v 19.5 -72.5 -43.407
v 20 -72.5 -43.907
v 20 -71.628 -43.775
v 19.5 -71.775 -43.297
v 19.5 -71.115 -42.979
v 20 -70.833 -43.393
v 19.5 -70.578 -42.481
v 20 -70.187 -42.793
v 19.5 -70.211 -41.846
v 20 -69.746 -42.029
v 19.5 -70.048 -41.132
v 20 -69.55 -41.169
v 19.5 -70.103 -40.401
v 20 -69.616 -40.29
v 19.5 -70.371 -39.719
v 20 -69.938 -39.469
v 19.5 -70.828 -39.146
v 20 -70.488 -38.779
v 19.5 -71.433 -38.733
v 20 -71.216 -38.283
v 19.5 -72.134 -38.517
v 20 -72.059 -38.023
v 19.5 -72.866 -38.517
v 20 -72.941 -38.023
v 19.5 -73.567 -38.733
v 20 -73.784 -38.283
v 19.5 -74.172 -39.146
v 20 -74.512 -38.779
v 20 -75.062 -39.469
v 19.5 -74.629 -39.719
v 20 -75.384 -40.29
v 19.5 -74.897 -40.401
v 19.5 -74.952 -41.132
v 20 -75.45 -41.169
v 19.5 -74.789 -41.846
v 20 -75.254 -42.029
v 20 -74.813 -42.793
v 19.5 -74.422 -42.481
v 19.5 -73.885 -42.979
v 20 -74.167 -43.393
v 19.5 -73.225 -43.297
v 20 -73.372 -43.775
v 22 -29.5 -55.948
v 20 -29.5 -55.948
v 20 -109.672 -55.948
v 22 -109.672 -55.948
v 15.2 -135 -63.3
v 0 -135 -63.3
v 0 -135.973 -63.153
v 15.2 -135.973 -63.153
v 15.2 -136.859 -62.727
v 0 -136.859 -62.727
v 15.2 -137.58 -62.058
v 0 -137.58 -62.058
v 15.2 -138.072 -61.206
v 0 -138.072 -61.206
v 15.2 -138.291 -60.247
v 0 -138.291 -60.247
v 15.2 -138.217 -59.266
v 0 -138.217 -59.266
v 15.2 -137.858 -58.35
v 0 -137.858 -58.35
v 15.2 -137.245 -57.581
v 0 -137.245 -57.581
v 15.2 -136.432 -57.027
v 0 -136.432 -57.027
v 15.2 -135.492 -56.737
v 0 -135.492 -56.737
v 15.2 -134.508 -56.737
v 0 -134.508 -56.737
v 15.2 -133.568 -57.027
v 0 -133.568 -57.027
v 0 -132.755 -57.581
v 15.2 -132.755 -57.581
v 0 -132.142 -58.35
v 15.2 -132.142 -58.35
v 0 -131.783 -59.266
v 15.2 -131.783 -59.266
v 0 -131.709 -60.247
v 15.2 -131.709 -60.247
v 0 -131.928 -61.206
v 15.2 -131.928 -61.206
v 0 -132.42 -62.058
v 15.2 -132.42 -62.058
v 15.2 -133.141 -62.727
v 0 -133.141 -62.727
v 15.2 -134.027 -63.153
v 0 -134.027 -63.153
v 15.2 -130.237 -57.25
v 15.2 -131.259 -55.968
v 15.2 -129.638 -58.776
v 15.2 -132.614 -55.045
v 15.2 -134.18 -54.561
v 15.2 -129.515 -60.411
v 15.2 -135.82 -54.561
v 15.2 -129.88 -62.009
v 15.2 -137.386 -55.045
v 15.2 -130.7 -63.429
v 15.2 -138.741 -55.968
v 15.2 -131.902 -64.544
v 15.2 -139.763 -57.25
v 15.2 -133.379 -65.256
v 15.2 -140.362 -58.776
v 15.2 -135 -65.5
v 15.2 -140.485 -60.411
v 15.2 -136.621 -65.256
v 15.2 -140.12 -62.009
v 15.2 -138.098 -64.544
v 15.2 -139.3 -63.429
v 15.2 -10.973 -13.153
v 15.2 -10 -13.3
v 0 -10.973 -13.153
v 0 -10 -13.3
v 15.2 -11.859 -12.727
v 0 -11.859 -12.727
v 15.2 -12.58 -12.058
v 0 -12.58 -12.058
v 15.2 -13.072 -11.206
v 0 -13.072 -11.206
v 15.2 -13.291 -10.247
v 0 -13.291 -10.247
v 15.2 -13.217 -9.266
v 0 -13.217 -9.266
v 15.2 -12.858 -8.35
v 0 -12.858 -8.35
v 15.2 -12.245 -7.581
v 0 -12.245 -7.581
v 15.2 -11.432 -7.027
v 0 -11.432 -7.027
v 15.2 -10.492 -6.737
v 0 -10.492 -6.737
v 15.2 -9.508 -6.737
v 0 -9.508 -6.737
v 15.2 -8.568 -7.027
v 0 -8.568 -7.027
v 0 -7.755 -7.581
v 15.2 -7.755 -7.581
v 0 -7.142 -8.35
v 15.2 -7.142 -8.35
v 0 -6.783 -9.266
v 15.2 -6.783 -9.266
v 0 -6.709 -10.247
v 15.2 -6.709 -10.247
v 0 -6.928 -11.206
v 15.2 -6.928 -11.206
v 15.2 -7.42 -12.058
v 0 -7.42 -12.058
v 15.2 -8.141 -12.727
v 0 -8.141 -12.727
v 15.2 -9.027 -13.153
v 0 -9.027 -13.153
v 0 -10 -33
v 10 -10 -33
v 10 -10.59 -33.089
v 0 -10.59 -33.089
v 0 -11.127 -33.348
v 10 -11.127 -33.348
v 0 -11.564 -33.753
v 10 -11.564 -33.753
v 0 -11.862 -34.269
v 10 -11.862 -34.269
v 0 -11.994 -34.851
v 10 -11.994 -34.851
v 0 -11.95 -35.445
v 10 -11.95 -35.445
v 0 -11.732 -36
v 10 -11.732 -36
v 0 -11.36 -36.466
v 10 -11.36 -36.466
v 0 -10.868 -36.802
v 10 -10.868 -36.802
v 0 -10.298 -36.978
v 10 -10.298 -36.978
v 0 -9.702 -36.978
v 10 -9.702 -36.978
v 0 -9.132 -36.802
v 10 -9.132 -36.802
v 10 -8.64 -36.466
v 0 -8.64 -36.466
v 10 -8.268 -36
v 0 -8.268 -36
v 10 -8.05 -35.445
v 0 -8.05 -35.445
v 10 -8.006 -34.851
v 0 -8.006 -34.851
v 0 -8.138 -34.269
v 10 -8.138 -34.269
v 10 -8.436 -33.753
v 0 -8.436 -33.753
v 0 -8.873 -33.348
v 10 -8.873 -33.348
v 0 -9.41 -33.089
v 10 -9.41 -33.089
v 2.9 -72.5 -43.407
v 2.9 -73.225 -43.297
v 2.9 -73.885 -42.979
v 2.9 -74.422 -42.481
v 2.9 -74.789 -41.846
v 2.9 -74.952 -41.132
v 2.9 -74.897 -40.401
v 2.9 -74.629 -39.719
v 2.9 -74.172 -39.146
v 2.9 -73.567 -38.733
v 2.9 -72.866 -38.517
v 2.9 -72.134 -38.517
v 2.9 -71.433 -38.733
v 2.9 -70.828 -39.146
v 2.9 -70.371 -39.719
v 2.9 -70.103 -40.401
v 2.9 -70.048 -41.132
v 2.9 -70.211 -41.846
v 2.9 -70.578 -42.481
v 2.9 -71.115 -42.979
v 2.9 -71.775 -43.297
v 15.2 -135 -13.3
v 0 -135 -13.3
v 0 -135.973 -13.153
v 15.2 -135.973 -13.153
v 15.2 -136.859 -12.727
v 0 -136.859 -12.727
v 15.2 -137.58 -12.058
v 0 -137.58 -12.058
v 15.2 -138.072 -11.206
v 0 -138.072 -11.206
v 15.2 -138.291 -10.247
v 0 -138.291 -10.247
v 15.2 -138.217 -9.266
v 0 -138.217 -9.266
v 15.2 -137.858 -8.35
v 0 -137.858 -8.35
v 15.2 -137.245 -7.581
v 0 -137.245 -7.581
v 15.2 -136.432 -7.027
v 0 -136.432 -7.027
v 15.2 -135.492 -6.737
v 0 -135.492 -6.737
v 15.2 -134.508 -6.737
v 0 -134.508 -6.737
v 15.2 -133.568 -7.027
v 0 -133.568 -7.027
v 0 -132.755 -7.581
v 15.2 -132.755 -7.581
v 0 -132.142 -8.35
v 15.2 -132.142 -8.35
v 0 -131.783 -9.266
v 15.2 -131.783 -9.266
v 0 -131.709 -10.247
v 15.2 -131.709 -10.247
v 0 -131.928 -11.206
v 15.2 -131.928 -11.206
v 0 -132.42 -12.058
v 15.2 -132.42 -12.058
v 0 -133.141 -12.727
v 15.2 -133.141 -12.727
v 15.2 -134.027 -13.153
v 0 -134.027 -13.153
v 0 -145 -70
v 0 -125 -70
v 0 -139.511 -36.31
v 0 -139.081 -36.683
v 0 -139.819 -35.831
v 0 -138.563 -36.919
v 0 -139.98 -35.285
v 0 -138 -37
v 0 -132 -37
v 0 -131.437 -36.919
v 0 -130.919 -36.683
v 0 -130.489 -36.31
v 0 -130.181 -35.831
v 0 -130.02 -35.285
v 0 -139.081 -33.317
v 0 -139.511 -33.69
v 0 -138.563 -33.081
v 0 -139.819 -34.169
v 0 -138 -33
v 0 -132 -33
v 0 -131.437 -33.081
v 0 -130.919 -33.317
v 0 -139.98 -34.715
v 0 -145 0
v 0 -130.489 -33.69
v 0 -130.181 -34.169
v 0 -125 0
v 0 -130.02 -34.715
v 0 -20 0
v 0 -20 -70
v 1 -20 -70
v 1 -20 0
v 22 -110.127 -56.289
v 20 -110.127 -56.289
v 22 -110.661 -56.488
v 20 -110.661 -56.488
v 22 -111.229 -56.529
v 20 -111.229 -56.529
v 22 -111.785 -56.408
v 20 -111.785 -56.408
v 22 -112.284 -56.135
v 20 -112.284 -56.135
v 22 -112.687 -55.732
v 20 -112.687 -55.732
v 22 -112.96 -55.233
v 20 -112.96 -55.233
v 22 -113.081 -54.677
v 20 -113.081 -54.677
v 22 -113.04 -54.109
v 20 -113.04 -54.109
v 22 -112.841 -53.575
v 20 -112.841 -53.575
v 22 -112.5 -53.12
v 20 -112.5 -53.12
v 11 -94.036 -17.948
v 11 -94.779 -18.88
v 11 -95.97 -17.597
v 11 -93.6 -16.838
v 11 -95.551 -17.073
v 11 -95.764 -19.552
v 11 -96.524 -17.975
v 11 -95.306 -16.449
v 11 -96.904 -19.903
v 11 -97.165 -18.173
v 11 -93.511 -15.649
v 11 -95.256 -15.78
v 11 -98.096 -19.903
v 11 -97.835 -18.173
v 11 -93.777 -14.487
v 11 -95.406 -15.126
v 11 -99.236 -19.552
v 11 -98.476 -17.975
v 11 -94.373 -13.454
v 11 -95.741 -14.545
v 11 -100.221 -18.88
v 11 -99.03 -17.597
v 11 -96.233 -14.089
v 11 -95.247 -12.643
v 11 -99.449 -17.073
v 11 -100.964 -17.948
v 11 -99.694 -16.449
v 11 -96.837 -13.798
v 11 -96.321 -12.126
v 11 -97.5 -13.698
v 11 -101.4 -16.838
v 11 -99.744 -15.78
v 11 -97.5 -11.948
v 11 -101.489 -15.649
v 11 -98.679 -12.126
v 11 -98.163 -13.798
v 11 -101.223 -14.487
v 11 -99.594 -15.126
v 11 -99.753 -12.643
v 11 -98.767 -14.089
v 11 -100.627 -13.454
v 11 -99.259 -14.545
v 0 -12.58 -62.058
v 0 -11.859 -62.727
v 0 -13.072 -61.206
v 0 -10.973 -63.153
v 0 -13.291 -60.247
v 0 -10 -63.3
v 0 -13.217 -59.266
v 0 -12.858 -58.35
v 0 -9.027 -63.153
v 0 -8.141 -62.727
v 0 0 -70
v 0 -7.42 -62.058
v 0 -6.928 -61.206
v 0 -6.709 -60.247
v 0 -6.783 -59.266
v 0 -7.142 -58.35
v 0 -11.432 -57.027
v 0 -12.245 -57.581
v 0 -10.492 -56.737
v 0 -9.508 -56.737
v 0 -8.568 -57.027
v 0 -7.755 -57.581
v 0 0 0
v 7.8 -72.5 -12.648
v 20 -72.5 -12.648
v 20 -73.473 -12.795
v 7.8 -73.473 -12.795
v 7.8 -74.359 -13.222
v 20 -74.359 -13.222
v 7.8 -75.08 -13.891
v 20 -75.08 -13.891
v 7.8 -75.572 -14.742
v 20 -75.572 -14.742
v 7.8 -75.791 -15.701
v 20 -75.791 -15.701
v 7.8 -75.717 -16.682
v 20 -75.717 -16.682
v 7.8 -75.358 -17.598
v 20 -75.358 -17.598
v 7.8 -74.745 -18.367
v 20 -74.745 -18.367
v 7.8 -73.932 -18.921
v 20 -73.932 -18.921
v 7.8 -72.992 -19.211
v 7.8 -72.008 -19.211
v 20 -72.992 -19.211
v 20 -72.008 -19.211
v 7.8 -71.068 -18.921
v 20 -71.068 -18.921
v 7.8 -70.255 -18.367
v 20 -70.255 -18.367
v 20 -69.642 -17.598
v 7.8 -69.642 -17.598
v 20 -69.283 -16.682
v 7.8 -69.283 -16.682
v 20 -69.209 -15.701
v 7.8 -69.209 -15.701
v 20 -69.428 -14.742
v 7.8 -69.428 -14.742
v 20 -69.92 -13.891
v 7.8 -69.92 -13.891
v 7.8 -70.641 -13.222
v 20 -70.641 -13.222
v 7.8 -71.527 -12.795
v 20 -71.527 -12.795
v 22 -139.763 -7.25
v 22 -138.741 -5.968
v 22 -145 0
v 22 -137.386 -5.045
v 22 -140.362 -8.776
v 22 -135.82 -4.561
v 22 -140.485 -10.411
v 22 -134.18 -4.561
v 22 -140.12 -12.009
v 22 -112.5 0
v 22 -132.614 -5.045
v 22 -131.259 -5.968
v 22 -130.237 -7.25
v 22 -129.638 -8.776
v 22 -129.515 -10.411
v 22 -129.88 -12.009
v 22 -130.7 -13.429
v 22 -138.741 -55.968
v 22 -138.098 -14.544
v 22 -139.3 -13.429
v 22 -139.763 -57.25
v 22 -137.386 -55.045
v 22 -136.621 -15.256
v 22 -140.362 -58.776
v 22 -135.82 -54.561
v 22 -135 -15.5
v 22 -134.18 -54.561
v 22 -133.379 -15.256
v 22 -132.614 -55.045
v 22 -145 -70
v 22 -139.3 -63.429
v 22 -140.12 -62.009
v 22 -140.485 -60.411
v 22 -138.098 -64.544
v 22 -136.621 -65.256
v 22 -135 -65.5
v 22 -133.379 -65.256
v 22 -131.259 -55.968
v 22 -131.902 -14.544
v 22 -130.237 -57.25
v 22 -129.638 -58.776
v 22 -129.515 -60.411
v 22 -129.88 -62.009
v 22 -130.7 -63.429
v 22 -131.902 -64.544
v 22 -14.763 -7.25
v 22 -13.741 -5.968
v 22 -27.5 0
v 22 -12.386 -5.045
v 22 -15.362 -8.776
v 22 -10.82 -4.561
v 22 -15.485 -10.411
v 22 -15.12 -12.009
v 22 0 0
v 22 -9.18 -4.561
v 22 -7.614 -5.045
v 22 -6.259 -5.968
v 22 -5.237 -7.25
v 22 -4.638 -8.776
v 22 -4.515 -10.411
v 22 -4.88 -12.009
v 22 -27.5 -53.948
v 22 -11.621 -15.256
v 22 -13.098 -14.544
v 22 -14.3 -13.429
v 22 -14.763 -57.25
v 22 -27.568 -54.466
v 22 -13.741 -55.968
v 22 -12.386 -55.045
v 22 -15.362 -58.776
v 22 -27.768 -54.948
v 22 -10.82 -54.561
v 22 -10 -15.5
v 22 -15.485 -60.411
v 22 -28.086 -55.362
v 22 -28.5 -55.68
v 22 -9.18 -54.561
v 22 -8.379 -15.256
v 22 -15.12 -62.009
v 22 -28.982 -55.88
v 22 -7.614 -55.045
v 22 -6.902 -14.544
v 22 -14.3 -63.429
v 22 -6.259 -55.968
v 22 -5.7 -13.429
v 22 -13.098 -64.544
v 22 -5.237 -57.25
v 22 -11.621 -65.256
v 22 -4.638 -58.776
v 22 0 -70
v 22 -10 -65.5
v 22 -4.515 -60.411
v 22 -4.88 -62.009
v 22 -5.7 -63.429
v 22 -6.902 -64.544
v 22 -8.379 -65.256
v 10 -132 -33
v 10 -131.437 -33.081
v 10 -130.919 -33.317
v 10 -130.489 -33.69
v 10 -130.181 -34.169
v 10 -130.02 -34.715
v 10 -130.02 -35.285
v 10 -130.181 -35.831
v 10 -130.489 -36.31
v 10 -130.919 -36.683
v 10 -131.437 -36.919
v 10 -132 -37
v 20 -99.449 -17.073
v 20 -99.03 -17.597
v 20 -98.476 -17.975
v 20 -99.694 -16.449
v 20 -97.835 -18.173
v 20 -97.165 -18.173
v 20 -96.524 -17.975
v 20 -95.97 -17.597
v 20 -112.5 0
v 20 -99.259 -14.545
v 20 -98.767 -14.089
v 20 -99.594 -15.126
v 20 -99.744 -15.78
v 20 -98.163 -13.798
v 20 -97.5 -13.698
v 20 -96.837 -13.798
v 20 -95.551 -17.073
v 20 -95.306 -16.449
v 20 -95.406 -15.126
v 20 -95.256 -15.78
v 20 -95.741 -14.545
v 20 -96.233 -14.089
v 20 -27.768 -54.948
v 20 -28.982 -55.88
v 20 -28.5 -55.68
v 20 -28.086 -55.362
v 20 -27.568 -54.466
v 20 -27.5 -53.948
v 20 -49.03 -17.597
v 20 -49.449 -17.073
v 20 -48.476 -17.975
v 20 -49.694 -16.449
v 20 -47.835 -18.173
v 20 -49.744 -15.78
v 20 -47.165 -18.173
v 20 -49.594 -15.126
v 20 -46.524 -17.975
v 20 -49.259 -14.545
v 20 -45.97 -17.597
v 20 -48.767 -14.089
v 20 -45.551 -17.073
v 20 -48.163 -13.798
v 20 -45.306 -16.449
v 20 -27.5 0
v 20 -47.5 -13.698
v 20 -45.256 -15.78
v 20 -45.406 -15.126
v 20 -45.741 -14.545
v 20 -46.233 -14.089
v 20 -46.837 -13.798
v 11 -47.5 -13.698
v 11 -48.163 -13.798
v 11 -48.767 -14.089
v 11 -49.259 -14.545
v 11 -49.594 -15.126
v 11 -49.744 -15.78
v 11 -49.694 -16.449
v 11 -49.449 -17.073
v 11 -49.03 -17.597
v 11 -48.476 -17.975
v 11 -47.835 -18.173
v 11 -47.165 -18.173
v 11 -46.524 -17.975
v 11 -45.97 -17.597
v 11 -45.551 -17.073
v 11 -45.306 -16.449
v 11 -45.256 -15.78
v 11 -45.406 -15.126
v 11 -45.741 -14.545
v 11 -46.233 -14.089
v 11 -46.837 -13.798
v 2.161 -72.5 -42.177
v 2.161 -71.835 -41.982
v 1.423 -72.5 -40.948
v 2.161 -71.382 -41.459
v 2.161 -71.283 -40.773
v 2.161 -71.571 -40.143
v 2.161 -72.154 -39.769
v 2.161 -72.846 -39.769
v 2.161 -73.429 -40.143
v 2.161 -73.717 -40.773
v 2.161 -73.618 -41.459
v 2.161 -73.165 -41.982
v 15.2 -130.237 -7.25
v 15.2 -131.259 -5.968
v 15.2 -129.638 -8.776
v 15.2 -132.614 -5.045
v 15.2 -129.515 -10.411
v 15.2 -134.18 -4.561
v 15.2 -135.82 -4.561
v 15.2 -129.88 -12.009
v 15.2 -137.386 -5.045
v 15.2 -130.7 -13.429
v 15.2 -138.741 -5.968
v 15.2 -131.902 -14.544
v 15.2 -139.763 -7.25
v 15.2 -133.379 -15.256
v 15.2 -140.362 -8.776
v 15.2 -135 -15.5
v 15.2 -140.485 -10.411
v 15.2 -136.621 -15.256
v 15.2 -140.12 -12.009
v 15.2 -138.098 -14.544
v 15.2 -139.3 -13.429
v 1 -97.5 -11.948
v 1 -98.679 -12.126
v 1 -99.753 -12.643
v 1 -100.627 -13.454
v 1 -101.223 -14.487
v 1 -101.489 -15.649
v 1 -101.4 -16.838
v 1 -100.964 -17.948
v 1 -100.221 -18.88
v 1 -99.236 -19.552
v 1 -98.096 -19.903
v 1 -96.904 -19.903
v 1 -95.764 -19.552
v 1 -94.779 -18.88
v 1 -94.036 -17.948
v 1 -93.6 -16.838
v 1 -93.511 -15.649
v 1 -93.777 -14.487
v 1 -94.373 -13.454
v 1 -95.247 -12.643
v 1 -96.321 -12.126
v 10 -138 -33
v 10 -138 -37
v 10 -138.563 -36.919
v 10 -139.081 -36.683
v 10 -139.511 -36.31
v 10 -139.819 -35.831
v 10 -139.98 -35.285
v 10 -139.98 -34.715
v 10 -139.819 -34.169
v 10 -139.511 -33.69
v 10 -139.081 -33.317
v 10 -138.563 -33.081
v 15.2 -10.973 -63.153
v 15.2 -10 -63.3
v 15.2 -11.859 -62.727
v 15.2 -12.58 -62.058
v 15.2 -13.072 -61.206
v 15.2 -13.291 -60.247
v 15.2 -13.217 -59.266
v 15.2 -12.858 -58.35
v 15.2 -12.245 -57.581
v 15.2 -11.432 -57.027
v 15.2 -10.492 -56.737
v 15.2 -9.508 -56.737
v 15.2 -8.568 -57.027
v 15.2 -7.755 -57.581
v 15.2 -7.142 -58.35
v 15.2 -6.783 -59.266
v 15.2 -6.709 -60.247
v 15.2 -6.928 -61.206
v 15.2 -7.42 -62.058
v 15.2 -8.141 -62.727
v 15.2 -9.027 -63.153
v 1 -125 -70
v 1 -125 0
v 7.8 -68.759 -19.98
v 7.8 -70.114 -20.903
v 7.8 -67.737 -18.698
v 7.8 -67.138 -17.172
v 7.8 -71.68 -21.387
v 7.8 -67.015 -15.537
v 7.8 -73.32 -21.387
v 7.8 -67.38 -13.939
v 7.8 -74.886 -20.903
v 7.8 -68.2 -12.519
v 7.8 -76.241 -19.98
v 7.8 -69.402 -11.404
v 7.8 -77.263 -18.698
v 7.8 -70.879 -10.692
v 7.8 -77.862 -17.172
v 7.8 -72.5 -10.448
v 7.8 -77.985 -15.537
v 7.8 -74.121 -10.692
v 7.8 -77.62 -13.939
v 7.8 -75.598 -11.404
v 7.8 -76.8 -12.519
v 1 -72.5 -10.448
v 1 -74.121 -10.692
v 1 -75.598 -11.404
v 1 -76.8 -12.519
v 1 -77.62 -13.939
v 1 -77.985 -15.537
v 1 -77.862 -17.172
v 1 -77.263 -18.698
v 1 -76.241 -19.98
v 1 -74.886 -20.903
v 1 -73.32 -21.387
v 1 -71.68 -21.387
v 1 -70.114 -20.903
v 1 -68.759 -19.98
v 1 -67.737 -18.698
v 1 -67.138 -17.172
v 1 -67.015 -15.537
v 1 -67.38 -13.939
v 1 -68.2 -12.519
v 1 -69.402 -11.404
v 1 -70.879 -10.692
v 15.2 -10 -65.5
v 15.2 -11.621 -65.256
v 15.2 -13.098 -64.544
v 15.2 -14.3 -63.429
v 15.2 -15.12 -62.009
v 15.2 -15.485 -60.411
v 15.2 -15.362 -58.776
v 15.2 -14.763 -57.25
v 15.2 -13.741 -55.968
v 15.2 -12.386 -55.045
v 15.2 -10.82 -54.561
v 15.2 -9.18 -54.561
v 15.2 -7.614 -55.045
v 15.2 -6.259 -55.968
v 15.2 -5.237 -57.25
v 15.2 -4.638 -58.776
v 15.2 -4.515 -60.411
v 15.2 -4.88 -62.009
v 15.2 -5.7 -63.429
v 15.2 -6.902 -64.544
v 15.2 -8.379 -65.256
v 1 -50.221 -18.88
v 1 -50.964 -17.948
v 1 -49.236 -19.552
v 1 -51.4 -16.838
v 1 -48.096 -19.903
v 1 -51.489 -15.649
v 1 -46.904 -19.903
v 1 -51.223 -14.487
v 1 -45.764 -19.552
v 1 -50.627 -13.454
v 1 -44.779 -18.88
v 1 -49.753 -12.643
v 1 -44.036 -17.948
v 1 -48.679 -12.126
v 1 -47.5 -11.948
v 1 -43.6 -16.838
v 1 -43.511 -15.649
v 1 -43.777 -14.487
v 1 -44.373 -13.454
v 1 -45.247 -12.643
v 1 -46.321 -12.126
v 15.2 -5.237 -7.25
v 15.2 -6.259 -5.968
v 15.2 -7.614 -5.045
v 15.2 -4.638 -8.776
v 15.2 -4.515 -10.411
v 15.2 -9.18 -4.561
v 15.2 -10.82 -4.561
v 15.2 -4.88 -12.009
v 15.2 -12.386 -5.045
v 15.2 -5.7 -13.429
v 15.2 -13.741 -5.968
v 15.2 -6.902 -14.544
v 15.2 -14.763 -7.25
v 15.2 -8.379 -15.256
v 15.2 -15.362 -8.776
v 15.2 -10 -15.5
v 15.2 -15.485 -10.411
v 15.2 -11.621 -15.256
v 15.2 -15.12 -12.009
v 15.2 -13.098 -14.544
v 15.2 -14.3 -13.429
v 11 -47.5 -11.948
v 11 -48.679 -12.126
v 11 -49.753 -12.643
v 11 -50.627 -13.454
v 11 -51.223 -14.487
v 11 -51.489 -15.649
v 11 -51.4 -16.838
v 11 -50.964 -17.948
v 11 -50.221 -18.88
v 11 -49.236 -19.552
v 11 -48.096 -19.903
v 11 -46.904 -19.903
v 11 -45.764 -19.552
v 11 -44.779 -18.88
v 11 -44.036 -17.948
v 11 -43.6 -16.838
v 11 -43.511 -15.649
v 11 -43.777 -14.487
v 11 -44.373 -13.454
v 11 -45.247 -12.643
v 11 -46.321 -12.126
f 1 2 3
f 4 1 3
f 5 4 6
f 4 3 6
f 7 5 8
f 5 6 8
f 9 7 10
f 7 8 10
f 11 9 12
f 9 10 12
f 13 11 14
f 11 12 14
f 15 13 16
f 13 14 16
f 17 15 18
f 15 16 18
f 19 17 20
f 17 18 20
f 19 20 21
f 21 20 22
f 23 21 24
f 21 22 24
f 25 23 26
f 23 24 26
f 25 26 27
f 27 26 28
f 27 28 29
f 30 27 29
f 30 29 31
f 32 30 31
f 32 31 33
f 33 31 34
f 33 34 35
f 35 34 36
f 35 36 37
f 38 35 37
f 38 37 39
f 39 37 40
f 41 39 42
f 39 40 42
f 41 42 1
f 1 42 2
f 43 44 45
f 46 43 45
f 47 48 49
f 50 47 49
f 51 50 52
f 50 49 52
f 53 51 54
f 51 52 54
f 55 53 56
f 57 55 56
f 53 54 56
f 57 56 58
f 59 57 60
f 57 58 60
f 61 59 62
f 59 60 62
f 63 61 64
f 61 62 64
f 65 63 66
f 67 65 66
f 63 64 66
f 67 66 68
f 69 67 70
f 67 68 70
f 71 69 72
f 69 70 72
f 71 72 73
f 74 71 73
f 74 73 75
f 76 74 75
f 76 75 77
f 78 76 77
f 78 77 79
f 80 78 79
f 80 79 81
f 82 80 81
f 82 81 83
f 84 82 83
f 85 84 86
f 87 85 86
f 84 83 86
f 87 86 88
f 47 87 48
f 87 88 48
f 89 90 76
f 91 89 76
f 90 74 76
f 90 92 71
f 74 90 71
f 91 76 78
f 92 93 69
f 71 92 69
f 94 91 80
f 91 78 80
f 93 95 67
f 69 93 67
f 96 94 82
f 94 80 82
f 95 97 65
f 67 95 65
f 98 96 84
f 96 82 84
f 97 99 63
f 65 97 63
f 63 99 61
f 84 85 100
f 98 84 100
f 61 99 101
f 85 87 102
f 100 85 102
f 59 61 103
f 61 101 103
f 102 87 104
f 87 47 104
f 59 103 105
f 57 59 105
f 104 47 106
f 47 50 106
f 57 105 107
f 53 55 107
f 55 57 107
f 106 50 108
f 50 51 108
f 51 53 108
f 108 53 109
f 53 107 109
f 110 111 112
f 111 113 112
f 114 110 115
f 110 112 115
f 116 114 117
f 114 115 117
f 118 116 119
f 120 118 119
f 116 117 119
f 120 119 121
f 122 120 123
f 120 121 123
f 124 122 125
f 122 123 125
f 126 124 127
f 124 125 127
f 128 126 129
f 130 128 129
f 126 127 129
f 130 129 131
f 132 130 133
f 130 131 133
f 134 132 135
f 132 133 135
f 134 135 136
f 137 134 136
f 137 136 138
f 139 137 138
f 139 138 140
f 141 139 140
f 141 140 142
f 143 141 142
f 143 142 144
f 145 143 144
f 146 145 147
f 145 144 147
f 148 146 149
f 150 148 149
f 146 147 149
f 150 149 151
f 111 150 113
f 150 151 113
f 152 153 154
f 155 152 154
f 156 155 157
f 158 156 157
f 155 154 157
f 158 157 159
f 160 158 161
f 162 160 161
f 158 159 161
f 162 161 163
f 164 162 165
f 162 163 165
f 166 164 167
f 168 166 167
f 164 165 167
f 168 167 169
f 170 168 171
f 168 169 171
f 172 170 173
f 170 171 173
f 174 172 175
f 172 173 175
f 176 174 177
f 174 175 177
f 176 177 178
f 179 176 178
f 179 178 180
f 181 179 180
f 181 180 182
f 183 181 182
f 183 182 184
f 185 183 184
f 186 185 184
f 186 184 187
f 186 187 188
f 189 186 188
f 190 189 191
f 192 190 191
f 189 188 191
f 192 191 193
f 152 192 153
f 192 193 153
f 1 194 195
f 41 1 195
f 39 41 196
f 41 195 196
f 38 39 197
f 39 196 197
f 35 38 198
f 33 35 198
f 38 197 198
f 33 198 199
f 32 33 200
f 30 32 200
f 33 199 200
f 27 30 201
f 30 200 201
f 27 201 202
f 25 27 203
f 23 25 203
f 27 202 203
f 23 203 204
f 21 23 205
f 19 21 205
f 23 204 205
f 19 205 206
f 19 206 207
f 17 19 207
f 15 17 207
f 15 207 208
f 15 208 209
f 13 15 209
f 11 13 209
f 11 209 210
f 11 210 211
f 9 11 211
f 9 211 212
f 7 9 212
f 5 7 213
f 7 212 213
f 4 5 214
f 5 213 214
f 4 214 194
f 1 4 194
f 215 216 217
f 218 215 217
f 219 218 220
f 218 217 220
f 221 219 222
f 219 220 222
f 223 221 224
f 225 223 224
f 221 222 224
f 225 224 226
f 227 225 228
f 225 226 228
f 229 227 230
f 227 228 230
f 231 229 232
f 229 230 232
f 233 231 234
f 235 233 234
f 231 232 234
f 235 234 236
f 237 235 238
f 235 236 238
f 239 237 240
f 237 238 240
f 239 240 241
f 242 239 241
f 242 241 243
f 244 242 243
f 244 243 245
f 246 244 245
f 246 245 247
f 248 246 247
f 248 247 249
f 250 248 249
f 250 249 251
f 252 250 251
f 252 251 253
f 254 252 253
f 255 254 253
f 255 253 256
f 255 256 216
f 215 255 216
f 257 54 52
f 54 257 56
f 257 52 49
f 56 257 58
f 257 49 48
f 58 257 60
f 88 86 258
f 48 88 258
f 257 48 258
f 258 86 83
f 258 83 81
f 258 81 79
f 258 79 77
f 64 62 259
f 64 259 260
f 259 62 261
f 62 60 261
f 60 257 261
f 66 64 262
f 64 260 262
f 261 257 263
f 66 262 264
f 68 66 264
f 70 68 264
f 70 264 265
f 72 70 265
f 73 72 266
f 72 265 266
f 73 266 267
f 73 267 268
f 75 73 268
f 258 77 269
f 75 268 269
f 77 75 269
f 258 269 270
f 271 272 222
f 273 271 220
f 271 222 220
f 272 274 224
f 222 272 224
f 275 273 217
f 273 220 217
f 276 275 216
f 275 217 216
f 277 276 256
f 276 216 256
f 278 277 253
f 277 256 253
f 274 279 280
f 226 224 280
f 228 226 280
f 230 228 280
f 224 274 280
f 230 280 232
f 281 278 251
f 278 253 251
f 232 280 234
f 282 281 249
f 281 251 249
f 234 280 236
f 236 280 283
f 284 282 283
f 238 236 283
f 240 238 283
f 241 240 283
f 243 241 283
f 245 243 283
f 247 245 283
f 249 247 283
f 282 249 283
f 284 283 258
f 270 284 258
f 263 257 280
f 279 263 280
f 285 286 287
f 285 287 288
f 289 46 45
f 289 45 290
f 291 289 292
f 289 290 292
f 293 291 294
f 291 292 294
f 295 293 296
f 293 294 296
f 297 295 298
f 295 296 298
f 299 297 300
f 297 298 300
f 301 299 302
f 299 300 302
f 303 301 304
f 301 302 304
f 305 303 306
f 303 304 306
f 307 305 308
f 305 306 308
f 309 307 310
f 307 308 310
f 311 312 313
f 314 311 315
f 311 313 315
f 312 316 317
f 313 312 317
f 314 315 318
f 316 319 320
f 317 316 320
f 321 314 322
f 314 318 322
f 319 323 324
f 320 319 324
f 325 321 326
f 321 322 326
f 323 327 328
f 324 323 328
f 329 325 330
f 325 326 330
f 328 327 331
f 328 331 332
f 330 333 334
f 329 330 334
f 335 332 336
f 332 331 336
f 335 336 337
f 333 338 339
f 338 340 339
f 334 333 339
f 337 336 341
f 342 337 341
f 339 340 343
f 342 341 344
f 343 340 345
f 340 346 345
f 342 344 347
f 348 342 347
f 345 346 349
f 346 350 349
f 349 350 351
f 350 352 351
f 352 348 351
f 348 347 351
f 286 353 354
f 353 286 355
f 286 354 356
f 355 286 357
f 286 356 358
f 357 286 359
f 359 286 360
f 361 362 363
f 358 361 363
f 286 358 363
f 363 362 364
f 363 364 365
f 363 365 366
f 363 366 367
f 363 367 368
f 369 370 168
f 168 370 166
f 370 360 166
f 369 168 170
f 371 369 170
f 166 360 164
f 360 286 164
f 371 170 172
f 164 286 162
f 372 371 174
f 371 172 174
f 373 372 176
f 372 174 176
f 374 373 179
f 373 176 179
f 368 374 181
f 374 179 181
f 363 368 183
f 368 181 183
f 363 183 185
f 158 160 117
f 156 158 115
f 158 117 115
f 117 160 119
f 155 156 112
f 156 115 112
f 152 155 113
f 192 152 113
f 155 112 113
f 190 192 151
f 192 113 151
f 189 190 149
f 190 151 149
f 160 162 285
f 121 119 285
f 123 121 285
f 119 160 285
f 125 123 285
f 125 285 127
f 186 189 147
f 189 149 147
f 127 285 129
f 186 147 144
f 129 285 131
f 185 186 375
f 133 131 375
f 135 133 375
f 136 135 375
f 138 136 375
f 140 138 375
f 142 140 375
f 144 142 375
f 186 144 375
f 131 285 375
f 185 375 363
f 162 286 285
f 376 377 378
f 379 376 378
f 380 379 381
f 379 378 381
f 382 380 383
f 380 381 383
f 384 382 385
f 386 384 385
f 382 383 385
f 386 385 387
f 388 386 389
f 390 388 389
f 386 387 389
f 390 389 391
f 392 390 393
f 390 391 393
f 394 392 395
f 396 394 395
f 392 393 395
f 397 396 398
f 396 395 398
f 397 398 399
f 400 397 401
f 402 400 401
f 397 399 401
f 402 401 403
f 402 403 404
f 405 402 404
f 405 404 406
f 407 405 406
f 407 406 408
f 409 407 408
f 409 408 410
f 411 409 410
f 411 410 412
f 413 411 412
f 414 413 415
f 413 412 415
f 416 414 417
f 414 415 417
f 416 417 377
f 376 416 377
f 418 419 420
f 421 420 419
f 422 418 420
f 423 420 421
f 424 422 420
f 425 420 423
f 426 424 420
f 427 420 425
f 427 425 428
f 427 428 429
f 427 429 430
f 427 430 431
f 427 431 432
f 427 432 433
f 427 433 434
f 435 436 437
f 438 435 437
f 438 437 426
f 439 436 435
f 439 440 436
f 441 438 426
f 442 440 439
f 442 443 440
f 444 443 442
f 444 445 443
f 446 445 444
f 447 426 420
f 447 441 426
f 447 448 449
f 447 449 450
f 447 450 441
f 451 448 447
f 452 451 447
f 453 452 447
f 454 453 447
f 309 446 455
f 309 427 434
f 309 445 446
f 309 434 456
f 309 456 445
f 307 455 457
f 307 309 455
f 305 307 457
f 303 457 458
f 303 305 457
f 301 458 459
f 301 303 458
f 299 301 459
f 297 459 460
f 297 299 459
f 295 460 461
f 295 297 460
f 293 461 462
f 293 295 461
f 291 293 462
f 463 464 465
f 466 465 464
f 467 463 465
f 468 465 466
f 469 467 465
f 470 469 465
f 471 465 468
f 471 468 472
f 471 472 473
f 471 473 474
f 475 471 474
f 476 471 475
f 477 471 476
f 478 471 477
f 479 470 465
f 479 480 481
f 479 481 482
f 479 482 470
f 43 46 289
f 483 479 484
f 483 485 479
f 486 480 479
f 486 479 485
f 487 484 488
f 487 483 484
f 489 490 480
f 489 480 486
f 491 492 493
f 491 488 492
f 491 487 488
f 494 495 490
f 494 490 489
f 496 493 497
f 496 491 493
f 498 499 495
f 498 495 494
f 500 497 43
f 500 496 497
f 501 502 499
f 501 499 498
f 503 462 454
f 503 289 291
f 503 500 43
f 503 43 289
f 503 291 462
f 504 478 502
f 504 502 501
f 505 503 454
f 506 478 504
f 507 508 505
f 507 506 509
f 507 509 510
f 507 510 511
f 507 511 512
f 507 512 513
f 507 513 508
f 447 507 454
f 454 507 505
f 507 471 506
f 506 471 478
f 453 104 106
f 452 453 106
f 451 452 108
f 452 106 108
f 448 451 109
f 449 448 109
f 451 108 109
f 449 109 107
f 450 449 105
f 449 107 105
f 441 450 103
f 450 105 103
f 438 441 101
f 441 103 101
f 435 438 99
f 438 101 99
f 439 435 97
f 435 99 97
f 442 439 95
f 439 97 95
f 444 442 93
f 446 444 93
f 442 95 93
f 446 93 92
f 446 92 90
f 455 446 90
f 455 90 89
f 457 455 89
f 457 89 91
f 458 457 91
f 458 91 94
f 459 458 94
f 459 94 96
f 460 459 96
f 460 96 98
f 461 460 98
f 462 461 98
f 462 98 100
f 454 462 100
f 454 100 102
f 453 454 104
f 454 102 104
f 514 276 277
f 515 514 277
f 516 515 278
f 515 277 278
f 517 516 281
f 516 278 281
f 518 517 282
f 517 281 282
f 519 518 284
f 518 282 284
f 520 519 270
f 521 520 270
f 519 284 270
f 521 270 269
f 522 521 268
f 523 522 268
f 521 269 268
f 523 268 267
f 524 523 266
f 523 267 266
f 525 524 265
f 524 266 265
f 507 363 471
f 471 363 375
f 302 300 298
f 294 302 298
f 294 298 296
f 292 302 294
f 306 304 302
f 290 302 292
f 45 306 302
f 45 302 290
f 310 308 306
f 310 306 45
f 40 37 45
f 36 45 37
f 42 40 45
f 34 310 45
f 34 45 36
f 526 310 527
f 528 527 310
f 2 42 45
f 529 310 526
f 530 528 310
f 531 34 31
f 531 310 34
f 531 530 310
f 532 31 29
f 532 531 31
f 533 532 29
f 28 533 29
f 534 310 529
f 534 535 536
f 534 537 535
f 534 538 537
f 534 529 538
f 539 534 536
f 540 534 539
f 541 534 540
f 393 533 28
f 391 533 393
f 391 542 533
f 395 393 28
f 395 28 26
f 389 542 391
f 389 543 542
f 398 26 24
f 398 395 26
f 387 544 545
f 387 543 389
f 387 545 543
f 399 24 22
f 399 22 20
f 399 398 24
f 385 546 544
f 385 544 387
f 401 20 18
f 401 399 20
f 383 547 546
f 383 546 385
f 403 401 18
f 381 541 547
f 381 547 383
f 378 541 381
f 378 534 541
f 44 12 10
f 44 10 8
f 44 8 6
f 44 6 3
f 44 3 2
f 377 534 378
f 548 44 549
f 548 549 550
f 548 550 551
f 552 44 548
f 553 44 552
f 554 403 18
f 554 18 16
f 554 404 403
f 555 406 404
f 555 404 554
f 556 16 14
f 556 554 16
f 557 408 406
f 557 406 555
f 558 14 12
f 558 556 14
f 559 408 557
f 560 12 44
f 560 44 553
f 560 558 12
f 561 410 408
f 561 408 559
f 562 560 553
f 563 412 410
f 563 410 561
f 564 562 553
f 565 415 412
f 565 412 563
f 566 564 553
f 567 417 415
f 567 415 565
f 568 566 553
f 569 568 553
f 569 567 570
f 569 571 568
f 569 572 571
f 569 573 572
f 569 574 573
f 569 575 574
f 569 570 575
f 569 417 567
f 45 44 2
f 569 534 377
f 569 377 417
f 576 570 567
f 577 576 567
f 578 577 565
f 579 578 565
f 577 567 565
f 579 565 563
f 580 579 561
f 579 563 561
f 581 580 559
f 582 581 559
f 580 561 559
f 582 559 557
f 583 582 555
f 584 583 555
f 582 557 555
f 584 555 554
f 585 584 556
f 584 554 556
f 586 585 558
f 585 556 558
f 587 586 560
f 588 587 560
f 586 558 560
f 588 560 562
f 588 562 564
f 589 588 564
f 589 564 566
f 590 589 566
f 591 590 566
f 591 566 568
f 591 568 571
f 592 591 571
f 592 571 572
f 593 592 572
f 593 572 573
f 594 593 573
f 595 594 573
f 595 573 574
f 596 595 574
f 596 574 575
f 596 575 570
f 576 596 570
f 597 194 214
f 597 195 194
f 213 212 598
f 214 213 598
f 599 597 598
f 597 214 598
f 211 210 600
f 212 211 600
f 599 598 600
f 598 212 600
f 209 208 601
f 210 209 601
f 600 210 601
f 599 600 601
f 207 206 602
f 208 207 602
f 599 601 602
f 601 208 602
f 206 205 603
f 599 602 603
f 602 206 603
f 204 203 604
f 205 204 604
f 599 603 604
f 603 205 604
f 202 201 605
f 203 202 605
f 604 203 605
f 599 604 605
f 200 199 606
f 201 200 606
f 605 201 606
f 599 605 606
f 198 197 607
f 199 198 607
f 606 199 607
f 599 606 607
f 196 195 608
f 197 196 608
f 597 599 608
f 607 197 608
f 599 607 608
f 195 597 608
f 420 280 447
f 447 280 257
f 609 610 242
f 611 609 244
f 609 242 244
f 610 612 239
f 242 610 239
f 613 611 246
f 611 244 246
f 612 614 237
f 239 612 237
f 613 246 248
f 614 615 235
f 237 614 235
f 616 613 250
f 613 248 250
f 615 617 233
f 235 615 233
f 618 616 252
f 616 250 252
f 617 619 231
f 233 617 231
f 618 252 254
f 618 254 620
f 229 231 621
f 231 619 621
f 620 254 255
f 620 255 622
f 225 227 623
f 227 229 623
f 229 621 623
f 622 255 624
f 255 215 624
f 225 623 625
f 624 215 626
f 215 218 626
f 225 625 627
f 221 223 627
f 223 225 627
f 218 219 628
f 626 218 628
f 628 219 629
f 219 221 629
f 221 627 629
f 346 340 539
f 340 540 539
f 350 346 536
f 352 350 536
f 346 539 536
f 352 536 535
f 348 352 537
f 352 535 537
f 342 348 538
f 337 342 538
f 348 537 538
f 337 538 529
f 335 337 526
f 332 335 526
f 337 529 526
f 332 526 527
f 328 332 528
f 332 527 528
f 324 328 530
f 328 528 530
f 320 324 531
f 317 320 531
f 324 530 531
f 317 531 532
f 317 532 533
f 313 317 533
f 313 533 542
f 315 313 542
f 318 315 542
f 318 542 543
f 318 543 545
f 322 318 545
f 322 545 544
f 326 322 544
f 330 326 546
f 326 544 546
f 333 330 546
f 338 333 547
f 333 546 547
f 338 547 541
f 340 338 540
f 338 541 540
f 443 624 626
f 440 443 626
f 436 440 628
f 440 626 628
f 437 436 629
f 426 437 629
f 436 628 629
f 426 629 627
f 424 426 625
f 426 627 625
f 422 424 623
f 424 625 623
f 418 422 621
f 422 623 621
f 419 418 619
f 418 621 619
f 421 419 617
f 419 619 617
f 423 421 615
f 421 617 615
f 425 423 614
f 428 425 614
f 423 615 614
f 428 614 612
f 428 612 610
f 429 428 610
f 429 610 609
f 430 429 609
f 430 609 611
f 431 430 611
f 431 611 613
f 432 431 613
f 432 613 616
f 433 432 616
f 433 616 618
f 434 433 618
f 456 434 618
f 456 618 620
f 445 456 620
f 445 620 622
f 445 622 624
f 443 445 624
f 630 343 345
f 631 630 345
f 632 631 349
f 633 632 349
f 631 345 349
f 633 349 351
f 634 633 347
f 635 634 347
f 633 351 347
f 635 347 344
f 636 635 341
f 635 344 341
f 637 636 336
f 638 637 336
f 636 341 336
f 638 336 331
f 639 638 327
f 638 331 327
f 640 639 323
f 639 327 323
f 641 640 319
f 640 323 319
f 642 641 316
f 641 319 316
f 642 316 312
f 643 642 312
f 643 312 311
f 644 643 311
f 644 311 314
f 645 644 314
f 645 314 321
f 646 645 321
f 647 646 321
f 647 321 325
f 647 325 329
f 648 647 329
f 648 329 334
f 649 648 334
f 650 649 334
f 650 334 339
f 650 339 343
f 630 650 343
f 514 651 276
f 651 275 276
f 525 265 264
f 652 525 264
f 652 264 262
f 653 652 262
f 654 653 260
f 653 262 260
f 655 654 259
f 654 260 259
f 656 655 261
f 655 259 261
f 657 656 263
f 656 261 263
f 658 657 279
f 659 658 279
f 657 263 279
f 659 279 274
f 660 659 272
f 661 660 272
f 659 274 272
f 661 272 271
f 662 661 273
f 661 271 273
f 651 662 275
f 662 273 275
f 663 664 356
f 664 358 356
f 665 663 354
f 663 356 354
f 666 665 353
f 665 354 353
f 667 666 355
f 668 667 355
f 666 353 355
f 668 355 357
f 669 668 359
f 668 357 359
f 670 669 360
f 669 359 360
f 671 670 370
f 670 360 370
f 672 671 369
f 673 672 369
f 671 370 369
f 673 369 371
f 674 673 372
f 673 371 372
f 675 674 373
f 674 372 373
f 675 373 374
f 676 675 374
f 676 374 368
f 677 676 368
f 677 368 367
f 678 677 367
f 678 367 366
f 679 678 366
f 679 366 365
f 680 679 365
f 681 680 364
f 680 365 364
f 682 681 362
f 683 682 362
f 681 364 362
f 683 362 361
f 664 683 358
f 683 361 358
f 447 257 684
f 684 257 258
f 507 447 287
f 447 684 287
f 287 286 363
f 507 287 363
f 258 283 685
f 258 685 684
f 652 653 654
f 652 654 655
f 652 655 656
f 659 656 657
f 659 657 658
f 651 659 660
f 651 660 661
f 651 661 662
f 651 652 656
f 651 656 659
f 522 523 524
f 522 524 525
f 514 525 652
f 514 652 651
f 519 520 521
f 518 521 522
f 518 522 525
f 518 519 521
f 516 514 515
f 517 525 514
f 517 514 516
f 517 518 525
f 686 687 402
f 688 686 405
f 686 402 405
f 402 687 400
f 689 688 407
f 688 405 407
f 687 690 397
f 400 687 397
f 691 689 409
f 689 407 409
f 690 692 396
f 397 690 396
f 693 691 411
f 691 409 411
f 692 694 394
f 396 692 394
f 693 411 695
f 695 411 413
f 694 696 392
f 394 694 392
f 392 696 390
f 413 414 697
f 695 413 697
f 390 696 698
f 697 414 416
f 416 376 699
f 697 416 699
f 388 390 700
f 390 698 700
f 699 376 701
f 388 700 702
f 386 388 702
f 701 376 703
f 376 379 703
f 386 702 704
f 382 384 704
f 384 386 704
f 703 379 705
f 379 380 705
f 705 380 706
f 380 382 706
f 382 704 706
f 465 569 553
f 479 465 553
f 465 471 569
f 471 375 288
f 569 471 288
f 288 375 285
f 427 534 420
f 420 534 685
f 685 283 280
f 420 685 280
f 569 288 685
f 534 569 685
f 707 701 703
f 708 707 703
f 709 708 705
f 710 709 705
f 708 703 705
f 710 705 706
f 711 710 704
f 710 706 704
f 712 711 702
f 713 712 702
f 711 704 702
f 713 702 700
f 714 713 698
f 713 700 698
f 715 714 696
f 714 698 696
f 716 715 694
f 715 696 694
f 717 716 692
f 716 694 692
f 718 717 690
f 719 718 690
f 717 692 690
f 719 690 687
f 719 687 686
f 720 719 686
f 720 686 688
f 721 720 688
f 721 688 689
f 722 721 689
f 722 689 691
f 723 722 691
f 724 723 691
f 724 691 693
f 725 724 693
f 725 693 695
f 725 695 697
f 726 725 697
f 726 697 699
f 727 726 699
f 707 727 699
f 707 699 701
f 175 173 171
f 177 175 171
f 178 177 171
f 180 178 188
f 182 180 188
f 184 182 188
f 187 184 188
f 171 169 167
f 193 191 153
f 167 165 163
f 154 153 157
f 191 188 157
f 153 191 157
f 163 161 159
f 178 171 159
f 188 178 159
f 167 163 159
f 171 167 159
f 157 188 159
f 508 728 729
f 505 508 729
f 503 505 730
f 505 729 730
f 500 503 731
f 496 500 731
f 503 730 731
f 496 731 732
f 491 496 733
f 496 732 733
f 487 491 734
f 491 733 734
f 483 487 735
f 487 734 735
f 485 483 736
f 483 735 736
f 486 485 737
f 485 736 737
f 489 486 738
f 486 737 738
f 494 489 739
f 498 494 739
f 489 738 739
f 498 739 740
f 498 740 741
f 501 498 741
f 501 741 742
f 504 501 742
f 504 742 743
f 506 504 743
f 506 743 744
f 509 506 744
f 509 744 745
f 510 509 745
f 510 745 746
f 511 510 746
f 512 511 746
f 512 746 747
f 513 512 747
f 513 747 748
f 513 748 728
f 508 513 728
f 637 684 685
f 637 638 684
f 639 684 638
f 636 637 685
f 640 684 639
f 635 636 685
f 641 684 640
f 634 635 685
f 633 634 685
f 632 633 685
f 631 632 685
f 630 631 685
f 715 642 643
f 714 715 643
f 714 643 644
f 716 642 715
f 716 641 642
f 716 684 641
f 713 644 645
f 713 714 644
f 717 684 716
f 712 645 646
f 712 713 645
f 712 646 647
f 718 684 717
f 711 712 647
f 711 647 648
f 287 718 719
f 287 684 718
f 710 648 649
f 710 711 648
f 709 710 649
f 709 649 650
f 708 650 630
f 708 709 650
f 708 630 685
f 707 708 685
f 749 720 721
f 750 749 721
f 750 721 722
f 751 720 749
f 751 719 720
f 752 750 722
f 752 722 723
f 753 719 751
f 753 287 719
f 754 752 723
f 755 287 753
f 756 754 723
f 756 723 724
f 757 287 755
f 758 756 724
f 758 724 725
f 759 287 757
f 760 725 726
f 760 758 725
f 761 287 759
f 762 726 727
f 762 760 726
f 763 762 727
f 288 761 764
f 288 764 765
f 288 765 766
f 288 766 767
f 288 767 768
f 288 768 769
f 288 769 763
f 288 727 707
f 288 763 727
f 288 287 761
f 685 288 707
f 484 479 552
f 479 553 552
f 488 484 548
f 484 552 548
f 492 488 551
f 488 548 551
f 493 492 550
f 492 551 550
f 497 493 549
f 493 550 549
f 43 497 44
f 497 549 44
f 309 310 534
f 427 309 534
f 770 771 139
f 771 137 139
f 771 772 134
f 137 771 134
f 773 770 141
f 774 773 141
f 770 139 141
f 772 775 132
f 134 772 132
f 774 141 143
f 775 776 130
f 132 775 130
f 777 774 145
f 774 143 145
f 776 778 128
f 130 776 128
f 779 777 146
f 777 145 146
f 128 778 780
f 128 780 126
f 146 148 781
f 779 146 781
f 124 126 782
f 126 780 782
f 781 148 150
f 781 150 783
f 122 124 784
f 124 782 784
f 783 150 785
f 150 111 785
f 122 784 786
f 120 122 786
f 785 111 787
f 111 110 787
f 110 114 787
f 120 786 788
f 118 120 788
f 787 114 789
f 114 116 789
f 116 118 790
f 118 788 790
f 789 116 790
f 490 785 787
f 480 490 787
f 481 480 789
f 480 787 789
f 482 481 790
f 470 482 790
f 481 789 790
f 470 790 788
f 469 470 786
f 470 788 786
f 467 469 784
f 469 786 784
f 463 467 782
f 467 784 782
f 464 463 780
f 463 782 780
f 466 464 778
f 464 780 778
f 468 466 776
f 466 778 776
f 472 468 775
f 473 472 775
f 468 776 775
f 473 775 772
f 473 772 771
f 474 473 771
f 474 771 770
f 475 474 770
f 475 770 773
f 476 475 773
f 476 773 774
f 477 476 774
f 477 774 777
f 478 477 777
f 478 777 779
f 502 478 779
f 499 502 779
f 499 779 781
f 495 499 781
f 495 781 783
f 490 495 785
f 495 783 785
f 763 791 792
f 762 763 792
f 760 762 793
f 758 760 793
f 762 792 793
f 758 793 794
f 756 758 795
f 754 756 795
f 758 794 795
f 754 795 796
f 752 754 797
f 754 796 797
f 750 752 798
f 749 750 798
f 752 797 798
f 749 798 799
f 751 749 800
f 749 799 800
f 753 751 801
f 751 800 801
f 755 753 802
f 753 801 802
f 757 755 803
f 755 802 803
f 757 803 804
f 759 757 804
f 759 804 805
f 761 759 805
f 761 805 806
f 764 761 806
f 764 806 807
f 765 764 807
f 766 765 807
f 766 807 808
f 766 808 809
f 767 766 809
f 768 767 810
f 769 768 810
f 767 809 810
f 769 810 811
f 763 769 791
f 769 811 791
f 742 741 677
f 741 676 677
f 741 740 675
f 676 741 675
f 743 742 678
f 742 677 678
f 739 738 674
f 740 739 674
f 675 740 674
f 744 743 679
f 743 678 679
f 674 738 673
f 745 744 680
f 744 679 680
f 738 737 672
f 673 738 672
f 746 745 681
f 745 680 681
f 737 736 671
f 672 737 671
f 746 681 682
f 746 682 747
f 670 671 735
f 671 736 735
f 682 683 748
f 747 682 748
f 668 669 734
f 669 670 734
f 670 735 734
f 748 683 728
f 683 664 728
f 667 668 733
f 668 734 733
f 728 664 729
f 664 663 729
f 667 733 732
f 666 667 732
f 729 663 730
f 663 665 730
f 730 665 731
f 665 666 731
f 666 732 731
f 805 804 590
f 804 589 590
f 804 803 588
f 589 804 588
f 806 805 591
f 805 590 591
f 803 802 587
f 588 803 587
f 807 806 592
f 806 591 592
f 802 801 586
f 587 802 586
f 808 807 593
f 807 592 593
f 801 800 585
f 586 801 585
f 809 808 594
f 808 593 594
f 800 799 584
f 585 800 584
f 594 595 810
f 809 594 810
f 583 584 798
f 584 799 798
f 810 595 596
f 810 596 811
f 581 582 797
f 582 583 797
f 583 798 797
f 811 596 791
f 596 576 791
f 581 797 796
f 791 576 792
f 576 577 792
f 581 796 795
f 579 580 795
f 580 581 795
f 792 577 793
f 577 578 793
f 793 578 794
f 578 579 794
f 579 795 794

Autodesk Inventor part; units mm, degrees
ref_plane "YZ Plane" through (0, 0, 0) normal (1, 0, 0) x (0, 1, 0)
ref_plane "XZ Plane" through (0, 0, 0) normal (0, 1, 0) x (-1, 0, 0)
ref_plane "XY Plane" through (0, 0, 0) normal (0, 0, 1) x (1, 0, 0)
sketch "Sketch1" plane through (0, 0, 0) normal (1, 0, 0) x (0, 1, 0)
  line L0 (0, 0) -> (-145, 0)
  line L1 (-145, 0) -> (-145, -70)
  line L2 (-145, -70) -> (0, -70)
  line L3 (0, -70) -> (0, 0)
  dimension "d0" = 145
  dimension "d1" = 70
extrude "Extrusion1" add sketch "Sketch1" along normal blind 20
sketch "Sketch5" plane through (20, 0, 0) normal (1, 0, 0) x (0, 0, -1)
  line L0 (49.9481, -33) -> (-5.5519, -33) projected
  arc A0 (-6.6519, -32.6703) -> (-5.5519, -33) centre (-5.5519, -31) ccw projected
  line L1 (-6.6519, -32.6703) -> (-6.6519, -47) projected
  arc A1 (-9.5519, -49.9) -> (-6.6519, -47) centre (-9.5519, -47) ccw projected
  line L2 (-9.5519, -49.9) -> (-23.8816, -49.9) projected
  arc A2 (-23.5519, -51) -> (-23.8816, -49.9) centre (-25.5519, -51) ccw projected
  line L3 (-23.5519, -51) -> (-23.5519, -106.5) projected
  arc A3 (-23.5519, -106.5) -> (-18.0519, -112) centre (-18.0519, -106.5) ccw projected
  line L4 (-18.0519, -112) -> (49.9481, -112) projected
  arc A4 (49.9481, -112) -> (55.4481, -106.5) centre (49.9481, -106.5) ccw projected
  line L5 (55.4481, -106.5) -> (55.4481, -38.5) projected
  arc A5 (55.4481, -38.5) -> (49.9481, -33) centre (49.9481, -38.5) ccw projected
  circle A6 centre (15.9481, -97.5) radius 1.65 projected
  circle A7 centre (15.9481, -47.5) radius 1.65 projected
  circle A8 centre (50.6979, -96.4808) radius 0.6924 projected
  circle A9 centre (-9.0519, -72.5) radius 5.5 projected
  circle A10 centre (40.9481, -72.5) radius 5.5 projected
  circle A11 centre (15.9481, -72.5) radius 2.5 projected
  circle A12 centre (-9.0519, -97.5) radius 4 projected
  circle A13 centre (40.9481, -47.5) radius 4 projected
  circle A14 centre (28.9481, -89.75) radius 1.5 projected
  circle A15 centre (47.9481, -43.6) radius 1.5 projected
  circle A16 centre (-12.9519, -104.5) radius 1.5 projected
  circle A17 centre (33.1981, -85.5) radius 1.5 projected
  circle A18 centre (-1.8019, -49.6) radius 1.5 projected
  circle A19 centre (-6.9519, -54.75) radius 1.5 projected
  line L6 (43.2888, -99.6225) -> (54.231, -96.5) projected
  line L7 (54.231, -96.5) -> (50.8902, -107.3775) projected
  line L8 (50.8902, -107.3775) -> (39.9481, -110.5) projected
  line L9 (39.9481, -110.5) -> (43.2888, -99.6225) projected
  line L10 (49.9481, -32.5) -> (-5.5519, -32.5) projected
  arc A20 (55.9481, -38.5) -> (49.9481, -32.5) centre (49.9481, -38.5) ccw projected
  line L11 (55.9481, -106.5) -> (55.9481, -38.5) projected
  arc A21 (49.9481, -112.5) -> (55.9481, -106.5) centre (49.9481, -106.5) ccw projected
  line L12 (-18.0519, -112.5) -> (49.9481, -112.5) projected
sketch "Sketch10" plane through (20, 0, 0) normal (1, 0, 0) x (0, 0, -1)
  line L0 (0, 0) -> (0, -145) construction
  line L1 (0, -145) -> (70, -145) construction
  line L2 (70, -145) -> (70, 0) construction
  line L3 (70, 0) -> (0, 0) construction
  line L4 (49.9481, -32.5) -> (-5.5519, -32.5) construction
  line L5 (55.9481, -106.5) -> (55.9481, -38.5) construction
  line L6 (-18.0519, -112.5) -> (49.9481, -112.5) construction
  line L7 (0, 0) -> (0, -145) construction
  line L8 (0, -112.5) -> (0, -145)
  line L9 (0, -145) -> (70, -145) projected
  line L10 (0, -145) -> (70, -145)
  line L11 (70, -145) -> (70, 0) projected
  line L12 (70, -145) -> (70, 0)
  line L13 (70, 0) -> (0, 0) projected
  line L14 (70, 0) -> (0, 0)
  line L15 (0, 0) -> (0, -27.5)
  line L16 (0, -27.5) -> (53.9481, -27.5)
  line L17 (55.9481, -29.5) -> (55.9481, -109.6716)
  line L18 (53.1196, -112.5) -> (0, -112.5)
  arc A0 (55.9481, -29.5) -> (53.9481, -27.5) centre (53.9481, -29.5) ccw
  line L19 (53.1196, -112.5) -> (55.9481, -109.6716) construction
  arc A1 (53.1196, -112.5) -> (55.9481, -109.6716) centre (54.5339, -111.0858) ccw
  dimension "d74" = 85
  dimension "d76" = 2
  dimension "d79" = 45
  dimension "d80" = 4
extrude "Extrusion2" add sketch "Sketch10" along normal blind 2
sketch "Sketch2" plane through (22, 0, 0) normal (1, 0, 0) x (0, 0, -1)
  line L0 (-23.2163, -0.5426) -> (-23.2163, -85.5426) construction
  line L1 (10, -10) -> (60, -10) construction
  line L2 (60, -10) -> (60, -135) construction
  line L3 (60, -135) -> (10, -135) construction
  line L4 (10, -135) -> (10, -10) construction
  line L5 (-23.2163, -85.5426) -> (29.9034, -85.5426)
  arc A0 (29.9034, -85.5426) -> (32.7318, -82.7142) centre (31.3176, -84.1284) ccw
  line L6 (32.7318, -82.7142) -> (32.7318, -2.5426)
  arc A1 (32.7318, -2.5426) -> (30.7318, -0.5426) centre (30.7318, -2.5426) ccw
  line L7 (30.7318, -0.5426) -> (-23.2163, -0.5426)
  line L8 (70, 0) -> (0, 0) projected
  line L9 (70, -145) -> (70, 0) projected
  dimension "d4" = 50
  dimension "d5" = 125
  dimension "d81" = 10
  dimension "d82" = 10
hole "M6CBoreToTable" at (22, -10, -10) at (22, -10, -60) at (22, -135, -60) at (22, -135, -10) direction (-1, 0, 0) diameter 6.6 end through all counterbore diameter 11 counterbore depth 6.8 clearance for "Socket Head Cap Screw ISO 4762" size "M6" standard "ISO"
hole "Hole9" at (20, -72.5, -40.9481) direction (-1, 0, 0) diameter 4.917 depth 17.1 tip angle 118 thread size "M6x1" class "6H" standard "ISO Metric profile"
chamfer "Chamfer1" distance 0.5 angle 45 1 edges at (20, -72.5, -38.4896)
sketch "Sketch11" plane through (0, 0, 0) normal (-1, 0, 0) x (0, 0, 1)
  circle A0 centre (-60, -10) radius 3.3 construction
  circle A1 centre (-10, -135) radius 3.3 construction
  line L0 (-60, -10) -> (-10, -10) construction
  line L1 (-10, -10) -> (-10, -135) construction
  line L2 (-10, -135) -> (-60, -135) construction
  line L3 (-60, -135) -> (-60, -10) construction
  circle A2 centre (-35, -10) radius 2
  line L4 (-35, -138) -> (-35, -132) construction
  line L5 (-33, -138) -> (-33, -132)
  line L6 (-37, -132) -> (-37, -138)
  arc A3 (-37, -138) -> (-33, -138) centre (-35, -138) ccw
  arc A4 (-33, -132) -> (-37, -132) centre (-35, -132) ccw
  point P0 (0, 0)
  point P1 (-35, -135)
  dimension "d86" = 4
  dimension "d87" = 3
  dimension "d88" = 4
hole "Hole10" at (0, -10, -35) at (0, -135, -35) at (0, -132, -35) at (0, -138, -35) direction (1, 0, 0) diameter 4 depth 10
extrude "Extrusion3" cut sketch "Sketch11" against normal up to surface (10 mm away) contours A3 L6 A4 L5
sketch "Sketch12" plane through (0, 0, 0) normal (-1, 0, 0) x (0, 0, 1)
  line L0 (-70, -145) -> (-70, 0) projected
  line L1 (0, -112.5) -> (0, -145) projected
  line L2 (-70, -20) -> (0, -20)
  line L3 (0, -20) -> (0, -125)
  line L4 (0, -125) -> (-70, -125)
  line L5 (-70, -125) -> (-70, -20)
  line L6 (-70, 0) -> (0, 0) projected
  line L7 (0, -145) -> (-70, -145) projected
  dimension "d98" = 20
  dimension "d99" = 20
extrude "Extrusion4" cut sketch "Sketch12" against normal blind 1 contours L0 L2 L3 L1 L4
sketch "Sketch6" plane through (1, 0, 0) normal (-1, 0, 0) x (0, 0, 1)
  point P0 (0, 0)
  point P1 (-15.9481, -47.5)
  point P2 (-15.9481, -97.5)
sketch "Sketch8" plane through (1, 0, 0) normal (-1, 0, 0) x (0, 0, 1)
  circle A0 centre (-15.9481, -72.5) radius 2.5
  point P0 (0, 0)
hole "M6CBoreToMounted" at (1, -72.5, -15.9481) direction (1, 0, 0) diameter 6.6 end through all counterbore diameter 11 counterbore depth 6.8 clearance for "Socket Head Cap Screw ISO 4762" size "M6" standard "ISO"
hole "Hole8" at (1, -47.5, -15.9481) at (1, -97.5, -15.9481) direction (1, 0, 0) diameter 4.5 end through all counterbore diameter 8 counterbore depth 10 clearance for "Socket Head Cap Screw ISO 4762" size "M4" standard "ISO"
equation "\"d86\" = d88"
equation "\"d89\" = d88"
properties part number "FAB-OX0009"
